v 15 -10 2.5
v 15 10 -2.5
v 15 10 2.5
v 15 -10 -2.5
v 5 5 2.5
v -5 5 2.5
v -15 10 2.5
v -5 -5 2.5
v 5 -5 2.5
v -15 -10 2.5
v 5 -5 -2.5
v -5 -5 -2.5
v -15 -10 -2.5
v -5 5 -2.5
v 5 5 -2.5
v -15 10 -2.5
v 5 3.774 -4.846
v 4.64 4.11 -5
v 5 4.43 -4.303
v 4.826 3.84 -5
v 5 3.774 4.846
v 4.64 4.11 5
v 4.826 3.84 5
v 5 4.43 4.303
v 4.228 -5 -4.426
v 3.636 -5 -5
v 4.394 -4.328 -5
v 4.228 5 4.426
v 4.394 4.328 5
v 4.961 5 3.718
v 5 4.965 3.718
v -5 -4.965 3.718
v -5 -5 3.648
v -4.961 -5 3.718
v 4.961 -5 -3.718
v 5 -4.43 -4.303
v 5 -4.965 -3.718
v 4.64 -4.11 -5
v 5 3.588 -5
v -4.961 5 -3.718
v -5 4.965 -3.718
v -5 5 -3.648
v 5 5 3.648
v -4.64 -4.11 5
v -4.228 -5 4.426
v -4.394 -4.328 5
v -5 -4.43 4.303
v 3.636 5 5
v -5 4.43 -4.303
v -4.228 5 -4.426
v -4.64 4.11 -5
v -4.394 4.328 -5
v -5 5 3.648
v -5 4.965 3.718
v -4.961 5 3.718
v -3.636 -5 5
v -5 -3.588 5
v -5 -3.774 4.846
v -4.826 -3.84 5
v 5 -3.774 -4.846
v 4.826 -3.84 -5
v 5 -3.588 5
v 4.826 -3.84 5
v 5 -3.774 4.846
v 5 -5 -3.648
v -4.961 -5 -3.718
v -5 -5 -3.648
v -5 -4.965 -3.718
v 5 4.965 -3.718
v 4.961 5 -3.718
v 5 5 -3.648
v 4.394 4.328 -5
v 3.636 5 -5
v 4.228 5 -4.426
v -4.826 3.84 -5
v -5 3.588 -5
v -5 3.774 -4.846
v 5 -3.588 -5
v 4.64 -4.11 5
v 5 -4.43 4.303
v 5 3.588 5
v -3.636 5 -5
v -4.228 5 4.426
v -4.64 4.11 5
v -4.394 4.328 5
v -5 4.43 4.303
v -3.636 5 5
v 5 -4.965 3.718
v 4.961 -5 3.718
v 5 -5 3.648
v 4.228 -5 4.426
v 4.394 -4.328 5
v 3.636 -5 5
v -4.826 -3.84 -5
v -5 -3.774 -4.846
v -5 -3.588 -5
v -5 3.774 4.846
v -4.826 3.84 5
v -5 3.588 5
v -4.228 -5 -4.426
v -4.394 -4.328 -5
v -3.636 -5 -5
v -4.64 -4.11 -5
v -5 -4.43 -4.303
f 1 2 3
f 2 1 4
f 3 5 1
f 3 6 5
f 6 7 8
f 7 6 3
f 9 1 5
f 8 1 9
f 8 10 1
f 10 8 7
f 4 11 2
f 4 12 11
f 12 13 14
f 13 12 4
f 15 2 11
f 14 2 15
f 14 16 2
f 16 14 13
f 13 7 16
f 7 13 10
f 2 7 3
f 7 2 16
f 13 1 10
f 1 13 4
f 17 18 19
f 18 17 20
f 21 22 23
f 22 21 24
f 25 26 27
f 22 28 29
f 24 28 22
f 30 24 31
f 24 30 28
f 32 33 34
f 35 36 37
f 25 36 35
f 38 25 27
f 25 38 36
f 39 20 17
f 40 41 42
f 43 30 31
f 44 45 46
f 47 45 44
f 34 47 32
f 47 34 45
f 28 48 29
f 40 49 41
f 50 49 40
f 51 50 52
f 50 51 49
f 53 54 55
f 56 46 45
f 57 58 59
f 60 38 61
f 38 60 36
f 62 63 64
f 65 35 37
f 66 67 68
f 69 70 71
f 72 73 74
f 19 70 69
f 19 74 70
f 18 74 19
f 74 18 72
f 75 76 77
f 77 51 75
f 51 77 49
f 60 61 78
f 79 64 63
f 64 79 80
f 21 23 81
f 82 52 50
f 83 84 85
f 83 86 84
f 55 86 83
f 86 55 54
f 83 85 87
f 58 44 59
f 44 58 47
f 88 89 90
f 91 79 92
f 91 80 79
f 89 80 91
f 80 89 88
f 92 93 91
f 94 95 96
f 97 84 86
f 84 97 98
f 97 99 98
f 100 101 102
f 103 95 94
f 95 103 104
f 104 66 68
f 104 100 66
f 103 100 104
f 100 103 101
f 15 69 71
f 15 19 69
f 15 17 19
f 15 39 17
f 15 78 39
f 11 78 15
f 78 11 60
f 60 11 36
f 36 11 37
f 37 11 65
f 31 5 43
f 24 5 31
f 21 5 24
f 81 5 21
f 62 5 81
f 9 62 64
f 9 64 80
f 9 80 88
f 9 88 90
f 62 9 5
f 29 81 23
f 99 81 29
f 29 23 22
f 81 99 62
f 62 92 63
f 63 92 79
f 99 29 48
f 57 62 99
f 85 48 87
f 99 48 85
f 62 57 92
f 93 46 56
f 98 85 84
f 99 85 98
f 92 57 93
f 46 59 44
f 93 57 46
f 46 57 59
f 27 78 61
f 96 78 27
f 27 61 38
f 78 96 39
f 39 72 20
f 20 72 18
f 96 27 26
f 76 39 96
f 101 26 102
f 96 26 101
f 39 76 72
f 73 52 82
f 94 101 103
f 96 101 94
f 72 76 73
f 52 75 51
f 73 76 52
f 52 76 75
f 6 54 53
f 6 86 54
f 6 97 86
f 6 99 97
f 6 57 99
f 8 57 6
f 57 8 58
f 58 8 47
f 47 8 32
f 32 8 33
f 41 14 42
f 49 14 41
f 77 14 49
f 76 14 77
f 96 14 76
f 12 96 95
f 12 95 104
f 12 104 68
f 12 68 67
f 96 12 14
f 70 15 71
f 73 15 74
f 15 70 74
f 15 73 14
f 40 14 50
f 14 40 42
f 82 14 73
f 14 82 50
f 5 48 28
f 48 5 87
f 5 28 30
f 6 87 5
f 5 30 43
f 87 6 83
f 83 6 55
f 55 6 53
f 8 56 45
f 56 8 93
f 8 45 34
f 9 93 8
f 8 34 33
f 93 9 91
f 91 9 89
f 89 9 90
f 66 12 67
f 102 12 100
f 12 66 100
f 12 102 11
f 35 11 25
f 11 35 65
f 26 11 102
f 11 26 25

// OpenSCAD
// A complex model for end-to-end testing.
// It creates a base plate with a hole and an intersected shape on top.
union() {
    // Base plate with a hole
    difference() {
        // A flat box
        cube([30, 20, 5], center = true);
        // A cylinder punched through it
        cylinder(h = 10, r = 4, center = true);
    }

    // A shape on top, created from an intersection
    intersection() {
        sphere(r = 8);
        cube([10, 10, 10], center = true);
    }
}
